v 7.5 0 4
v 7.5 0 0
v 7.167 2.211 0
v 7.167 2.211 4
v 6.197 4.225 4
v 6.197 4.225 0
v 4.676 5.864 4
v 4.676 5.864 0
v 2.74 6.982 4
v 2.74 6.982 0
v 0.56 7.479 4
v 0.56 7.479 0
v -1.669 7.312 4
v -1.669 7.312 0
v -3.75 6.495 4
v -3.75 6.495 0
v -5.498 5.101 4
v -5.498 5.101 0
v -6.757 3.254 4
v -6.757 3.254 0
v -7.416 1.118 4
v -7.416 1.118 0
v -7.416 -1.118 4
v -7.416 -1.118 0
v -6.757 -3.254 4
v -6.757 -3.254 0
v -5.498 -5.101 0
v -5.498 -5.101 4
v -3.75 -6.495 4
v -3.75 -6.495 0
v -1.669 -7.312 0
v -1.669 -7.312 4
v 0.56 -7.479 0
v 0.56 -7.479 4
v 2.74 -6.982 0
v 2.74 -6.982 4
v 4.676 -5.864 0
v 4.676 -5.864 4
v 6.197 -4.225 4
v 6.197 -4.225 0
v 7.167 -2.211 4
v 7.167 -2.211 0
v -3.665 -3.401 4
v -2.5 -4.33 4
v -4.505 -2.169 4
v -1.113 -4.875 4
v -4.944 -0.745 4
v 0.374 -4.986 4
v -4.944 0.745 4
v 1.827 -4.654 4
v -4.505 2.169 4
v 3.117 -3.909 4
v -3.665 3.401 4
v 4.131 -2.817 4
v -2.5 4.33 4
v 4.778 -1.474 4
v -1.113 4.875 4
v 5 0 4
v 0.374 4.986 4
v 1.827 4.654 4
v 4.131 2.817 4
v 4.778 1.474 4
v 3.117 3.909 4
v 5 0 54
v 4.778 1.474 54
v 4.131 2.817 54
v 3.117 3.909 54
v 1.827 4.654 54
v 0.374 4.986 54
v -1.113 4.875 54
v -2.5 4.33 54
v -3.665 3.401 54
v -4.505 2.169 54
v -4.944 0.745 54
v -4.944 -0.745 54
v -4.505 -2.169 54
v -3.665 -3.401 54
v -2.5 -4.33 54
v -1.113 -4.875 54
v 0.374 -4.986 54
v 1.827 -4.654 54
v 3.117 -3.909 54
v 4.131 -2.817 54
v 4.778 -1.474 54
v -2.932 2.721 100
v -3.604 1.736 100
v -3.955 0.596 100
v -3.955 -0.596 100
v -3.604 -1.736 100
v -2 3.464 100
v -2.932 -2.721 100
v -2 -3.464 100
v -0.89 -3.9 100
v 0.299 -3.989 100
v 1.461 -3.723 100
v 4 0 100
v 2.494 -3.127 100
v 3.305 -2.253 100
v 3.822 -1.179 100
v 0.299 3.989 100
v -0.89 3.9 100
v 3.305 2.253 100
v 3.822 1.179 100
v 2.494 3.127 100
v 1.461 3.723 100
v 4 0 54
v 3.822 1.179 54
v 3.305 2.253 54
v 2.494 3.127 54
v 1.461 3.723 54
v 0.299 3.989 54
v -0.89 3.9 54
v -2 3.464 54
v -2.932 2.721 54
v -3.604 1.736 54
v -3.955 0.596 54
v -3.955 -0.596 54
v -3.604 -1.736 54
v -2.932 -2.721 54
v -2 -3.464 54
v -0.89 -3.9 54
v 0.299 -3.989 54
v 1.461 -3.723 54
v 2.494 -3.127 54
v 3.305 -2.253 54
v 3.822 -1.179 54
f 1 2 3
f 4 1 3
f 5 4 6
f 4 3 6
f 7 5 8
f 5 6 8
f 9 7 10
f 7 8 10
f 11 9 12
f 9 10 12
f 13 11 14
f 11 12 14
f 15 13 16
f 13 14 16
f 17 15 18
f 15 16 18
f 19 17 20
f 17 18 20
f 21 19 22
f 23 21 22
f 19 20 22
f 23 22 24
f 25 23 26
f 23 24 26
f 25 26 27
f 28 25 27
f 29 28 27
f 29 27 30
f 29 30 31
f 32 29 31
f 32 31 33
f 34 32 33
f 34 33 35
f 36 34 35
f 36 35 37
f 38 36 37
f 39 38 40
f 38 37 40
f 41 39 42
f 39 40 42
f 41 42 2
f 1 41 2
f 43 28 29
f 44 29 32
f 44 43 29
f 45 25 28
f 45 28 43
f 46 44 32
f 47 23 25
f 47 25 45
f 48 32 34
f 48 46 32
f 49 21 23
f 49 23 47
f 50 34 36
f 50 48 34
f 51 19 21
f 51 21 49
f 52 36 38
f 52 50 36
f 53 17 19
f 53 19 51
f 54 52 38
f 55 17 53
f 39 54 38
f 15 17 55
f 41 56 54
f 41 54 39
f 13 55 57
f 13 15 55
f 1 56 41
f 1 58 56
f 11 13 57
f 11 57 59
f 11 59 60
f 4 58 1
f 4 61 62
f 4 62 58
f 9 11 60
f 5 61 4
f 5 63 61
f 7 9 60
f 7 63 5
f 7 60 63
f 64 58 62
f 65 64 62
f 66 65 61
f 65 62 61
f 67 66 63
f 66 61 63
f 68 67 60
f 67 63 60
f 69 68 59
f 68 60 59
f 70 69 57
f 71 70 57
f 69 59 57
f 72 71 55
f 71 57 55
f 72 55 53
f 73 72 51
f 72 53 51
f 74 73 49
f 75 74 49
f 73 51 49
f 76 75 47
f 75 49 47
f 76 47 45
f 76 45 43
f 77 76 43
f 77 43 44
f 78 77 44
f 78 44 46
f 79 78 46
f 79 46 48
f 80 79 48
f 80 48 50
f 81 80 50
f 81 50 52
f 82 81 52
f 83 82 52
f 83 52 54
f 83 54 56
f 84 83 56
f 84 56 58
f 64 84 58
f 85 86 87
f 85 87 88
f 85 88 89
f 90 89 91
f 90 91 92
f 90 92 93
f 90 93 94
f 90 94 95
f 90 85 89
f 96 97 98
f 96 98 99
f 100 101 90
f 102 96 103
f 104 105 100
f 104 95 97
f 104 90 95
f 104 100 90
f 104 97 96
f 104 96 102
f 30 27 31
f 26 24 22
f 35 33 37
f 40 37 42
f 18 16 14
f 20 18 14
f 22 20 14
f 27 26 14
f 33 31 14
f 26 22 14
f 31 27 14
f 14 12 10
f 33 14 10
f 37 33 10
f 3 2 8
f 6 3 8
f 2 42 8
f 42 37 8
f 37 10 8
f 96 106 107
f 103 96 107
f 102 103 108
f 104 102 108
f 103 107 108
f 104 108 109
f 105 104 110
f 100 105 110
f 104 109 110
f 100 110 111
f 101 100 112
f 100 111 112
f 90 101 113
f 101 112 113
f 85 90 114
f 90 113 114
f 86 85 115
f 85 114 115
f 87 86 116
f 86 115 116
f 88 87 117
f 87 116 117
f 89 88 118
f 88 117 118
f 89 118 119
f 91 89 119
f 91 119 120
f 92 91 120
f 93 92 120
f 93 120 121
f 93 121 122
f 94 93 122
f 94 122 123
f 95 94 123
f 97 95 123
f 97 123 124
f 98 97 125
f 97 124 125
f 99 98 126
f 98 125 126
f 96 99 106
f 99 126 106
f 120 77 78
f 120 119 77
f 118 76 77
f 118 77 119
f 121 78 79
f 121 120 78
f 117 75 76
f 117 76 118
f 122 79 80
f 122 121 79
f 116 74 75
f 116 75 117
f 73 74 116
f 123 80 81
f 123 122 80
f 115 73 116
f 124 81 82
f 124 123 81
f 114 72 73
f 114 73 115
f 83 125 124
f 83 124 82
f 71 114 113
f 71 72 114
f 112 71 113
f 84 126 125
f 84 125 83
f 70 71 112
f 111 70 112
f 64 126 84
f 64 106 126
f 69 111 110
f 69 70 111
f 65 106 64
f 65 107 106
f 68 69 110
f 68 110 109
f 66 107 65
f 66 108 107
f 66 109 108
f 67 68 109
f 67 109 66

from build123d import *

# Parameters (mm, degrees)
F0_R     = 7.5
F1_DEPTH = 4
F2_R     = 5
F3_DEPTH = 54
F4_R     = 4
F5_DEPTH = 46


with BuildPart() as f1:
    # F0 (on Top) → F1 (new body)
    with BuildSketch(Plane.XY):
        Circle(F0_R)
    extrude(amount=F1_DEPTH)

    # F2 (on Top) → F3 (join)
    with BuildSketch(Plane.XY):
        Circle(F2_R)
    extrude(amount=F3_DEPTH)

    # F4 (on face) → F5 (join)
    with BuildSketch(Plane.XY.offset(54)):
        Circle(F4_R)
    extrude(amount=F5_DEPTH)


solid = f1.part
